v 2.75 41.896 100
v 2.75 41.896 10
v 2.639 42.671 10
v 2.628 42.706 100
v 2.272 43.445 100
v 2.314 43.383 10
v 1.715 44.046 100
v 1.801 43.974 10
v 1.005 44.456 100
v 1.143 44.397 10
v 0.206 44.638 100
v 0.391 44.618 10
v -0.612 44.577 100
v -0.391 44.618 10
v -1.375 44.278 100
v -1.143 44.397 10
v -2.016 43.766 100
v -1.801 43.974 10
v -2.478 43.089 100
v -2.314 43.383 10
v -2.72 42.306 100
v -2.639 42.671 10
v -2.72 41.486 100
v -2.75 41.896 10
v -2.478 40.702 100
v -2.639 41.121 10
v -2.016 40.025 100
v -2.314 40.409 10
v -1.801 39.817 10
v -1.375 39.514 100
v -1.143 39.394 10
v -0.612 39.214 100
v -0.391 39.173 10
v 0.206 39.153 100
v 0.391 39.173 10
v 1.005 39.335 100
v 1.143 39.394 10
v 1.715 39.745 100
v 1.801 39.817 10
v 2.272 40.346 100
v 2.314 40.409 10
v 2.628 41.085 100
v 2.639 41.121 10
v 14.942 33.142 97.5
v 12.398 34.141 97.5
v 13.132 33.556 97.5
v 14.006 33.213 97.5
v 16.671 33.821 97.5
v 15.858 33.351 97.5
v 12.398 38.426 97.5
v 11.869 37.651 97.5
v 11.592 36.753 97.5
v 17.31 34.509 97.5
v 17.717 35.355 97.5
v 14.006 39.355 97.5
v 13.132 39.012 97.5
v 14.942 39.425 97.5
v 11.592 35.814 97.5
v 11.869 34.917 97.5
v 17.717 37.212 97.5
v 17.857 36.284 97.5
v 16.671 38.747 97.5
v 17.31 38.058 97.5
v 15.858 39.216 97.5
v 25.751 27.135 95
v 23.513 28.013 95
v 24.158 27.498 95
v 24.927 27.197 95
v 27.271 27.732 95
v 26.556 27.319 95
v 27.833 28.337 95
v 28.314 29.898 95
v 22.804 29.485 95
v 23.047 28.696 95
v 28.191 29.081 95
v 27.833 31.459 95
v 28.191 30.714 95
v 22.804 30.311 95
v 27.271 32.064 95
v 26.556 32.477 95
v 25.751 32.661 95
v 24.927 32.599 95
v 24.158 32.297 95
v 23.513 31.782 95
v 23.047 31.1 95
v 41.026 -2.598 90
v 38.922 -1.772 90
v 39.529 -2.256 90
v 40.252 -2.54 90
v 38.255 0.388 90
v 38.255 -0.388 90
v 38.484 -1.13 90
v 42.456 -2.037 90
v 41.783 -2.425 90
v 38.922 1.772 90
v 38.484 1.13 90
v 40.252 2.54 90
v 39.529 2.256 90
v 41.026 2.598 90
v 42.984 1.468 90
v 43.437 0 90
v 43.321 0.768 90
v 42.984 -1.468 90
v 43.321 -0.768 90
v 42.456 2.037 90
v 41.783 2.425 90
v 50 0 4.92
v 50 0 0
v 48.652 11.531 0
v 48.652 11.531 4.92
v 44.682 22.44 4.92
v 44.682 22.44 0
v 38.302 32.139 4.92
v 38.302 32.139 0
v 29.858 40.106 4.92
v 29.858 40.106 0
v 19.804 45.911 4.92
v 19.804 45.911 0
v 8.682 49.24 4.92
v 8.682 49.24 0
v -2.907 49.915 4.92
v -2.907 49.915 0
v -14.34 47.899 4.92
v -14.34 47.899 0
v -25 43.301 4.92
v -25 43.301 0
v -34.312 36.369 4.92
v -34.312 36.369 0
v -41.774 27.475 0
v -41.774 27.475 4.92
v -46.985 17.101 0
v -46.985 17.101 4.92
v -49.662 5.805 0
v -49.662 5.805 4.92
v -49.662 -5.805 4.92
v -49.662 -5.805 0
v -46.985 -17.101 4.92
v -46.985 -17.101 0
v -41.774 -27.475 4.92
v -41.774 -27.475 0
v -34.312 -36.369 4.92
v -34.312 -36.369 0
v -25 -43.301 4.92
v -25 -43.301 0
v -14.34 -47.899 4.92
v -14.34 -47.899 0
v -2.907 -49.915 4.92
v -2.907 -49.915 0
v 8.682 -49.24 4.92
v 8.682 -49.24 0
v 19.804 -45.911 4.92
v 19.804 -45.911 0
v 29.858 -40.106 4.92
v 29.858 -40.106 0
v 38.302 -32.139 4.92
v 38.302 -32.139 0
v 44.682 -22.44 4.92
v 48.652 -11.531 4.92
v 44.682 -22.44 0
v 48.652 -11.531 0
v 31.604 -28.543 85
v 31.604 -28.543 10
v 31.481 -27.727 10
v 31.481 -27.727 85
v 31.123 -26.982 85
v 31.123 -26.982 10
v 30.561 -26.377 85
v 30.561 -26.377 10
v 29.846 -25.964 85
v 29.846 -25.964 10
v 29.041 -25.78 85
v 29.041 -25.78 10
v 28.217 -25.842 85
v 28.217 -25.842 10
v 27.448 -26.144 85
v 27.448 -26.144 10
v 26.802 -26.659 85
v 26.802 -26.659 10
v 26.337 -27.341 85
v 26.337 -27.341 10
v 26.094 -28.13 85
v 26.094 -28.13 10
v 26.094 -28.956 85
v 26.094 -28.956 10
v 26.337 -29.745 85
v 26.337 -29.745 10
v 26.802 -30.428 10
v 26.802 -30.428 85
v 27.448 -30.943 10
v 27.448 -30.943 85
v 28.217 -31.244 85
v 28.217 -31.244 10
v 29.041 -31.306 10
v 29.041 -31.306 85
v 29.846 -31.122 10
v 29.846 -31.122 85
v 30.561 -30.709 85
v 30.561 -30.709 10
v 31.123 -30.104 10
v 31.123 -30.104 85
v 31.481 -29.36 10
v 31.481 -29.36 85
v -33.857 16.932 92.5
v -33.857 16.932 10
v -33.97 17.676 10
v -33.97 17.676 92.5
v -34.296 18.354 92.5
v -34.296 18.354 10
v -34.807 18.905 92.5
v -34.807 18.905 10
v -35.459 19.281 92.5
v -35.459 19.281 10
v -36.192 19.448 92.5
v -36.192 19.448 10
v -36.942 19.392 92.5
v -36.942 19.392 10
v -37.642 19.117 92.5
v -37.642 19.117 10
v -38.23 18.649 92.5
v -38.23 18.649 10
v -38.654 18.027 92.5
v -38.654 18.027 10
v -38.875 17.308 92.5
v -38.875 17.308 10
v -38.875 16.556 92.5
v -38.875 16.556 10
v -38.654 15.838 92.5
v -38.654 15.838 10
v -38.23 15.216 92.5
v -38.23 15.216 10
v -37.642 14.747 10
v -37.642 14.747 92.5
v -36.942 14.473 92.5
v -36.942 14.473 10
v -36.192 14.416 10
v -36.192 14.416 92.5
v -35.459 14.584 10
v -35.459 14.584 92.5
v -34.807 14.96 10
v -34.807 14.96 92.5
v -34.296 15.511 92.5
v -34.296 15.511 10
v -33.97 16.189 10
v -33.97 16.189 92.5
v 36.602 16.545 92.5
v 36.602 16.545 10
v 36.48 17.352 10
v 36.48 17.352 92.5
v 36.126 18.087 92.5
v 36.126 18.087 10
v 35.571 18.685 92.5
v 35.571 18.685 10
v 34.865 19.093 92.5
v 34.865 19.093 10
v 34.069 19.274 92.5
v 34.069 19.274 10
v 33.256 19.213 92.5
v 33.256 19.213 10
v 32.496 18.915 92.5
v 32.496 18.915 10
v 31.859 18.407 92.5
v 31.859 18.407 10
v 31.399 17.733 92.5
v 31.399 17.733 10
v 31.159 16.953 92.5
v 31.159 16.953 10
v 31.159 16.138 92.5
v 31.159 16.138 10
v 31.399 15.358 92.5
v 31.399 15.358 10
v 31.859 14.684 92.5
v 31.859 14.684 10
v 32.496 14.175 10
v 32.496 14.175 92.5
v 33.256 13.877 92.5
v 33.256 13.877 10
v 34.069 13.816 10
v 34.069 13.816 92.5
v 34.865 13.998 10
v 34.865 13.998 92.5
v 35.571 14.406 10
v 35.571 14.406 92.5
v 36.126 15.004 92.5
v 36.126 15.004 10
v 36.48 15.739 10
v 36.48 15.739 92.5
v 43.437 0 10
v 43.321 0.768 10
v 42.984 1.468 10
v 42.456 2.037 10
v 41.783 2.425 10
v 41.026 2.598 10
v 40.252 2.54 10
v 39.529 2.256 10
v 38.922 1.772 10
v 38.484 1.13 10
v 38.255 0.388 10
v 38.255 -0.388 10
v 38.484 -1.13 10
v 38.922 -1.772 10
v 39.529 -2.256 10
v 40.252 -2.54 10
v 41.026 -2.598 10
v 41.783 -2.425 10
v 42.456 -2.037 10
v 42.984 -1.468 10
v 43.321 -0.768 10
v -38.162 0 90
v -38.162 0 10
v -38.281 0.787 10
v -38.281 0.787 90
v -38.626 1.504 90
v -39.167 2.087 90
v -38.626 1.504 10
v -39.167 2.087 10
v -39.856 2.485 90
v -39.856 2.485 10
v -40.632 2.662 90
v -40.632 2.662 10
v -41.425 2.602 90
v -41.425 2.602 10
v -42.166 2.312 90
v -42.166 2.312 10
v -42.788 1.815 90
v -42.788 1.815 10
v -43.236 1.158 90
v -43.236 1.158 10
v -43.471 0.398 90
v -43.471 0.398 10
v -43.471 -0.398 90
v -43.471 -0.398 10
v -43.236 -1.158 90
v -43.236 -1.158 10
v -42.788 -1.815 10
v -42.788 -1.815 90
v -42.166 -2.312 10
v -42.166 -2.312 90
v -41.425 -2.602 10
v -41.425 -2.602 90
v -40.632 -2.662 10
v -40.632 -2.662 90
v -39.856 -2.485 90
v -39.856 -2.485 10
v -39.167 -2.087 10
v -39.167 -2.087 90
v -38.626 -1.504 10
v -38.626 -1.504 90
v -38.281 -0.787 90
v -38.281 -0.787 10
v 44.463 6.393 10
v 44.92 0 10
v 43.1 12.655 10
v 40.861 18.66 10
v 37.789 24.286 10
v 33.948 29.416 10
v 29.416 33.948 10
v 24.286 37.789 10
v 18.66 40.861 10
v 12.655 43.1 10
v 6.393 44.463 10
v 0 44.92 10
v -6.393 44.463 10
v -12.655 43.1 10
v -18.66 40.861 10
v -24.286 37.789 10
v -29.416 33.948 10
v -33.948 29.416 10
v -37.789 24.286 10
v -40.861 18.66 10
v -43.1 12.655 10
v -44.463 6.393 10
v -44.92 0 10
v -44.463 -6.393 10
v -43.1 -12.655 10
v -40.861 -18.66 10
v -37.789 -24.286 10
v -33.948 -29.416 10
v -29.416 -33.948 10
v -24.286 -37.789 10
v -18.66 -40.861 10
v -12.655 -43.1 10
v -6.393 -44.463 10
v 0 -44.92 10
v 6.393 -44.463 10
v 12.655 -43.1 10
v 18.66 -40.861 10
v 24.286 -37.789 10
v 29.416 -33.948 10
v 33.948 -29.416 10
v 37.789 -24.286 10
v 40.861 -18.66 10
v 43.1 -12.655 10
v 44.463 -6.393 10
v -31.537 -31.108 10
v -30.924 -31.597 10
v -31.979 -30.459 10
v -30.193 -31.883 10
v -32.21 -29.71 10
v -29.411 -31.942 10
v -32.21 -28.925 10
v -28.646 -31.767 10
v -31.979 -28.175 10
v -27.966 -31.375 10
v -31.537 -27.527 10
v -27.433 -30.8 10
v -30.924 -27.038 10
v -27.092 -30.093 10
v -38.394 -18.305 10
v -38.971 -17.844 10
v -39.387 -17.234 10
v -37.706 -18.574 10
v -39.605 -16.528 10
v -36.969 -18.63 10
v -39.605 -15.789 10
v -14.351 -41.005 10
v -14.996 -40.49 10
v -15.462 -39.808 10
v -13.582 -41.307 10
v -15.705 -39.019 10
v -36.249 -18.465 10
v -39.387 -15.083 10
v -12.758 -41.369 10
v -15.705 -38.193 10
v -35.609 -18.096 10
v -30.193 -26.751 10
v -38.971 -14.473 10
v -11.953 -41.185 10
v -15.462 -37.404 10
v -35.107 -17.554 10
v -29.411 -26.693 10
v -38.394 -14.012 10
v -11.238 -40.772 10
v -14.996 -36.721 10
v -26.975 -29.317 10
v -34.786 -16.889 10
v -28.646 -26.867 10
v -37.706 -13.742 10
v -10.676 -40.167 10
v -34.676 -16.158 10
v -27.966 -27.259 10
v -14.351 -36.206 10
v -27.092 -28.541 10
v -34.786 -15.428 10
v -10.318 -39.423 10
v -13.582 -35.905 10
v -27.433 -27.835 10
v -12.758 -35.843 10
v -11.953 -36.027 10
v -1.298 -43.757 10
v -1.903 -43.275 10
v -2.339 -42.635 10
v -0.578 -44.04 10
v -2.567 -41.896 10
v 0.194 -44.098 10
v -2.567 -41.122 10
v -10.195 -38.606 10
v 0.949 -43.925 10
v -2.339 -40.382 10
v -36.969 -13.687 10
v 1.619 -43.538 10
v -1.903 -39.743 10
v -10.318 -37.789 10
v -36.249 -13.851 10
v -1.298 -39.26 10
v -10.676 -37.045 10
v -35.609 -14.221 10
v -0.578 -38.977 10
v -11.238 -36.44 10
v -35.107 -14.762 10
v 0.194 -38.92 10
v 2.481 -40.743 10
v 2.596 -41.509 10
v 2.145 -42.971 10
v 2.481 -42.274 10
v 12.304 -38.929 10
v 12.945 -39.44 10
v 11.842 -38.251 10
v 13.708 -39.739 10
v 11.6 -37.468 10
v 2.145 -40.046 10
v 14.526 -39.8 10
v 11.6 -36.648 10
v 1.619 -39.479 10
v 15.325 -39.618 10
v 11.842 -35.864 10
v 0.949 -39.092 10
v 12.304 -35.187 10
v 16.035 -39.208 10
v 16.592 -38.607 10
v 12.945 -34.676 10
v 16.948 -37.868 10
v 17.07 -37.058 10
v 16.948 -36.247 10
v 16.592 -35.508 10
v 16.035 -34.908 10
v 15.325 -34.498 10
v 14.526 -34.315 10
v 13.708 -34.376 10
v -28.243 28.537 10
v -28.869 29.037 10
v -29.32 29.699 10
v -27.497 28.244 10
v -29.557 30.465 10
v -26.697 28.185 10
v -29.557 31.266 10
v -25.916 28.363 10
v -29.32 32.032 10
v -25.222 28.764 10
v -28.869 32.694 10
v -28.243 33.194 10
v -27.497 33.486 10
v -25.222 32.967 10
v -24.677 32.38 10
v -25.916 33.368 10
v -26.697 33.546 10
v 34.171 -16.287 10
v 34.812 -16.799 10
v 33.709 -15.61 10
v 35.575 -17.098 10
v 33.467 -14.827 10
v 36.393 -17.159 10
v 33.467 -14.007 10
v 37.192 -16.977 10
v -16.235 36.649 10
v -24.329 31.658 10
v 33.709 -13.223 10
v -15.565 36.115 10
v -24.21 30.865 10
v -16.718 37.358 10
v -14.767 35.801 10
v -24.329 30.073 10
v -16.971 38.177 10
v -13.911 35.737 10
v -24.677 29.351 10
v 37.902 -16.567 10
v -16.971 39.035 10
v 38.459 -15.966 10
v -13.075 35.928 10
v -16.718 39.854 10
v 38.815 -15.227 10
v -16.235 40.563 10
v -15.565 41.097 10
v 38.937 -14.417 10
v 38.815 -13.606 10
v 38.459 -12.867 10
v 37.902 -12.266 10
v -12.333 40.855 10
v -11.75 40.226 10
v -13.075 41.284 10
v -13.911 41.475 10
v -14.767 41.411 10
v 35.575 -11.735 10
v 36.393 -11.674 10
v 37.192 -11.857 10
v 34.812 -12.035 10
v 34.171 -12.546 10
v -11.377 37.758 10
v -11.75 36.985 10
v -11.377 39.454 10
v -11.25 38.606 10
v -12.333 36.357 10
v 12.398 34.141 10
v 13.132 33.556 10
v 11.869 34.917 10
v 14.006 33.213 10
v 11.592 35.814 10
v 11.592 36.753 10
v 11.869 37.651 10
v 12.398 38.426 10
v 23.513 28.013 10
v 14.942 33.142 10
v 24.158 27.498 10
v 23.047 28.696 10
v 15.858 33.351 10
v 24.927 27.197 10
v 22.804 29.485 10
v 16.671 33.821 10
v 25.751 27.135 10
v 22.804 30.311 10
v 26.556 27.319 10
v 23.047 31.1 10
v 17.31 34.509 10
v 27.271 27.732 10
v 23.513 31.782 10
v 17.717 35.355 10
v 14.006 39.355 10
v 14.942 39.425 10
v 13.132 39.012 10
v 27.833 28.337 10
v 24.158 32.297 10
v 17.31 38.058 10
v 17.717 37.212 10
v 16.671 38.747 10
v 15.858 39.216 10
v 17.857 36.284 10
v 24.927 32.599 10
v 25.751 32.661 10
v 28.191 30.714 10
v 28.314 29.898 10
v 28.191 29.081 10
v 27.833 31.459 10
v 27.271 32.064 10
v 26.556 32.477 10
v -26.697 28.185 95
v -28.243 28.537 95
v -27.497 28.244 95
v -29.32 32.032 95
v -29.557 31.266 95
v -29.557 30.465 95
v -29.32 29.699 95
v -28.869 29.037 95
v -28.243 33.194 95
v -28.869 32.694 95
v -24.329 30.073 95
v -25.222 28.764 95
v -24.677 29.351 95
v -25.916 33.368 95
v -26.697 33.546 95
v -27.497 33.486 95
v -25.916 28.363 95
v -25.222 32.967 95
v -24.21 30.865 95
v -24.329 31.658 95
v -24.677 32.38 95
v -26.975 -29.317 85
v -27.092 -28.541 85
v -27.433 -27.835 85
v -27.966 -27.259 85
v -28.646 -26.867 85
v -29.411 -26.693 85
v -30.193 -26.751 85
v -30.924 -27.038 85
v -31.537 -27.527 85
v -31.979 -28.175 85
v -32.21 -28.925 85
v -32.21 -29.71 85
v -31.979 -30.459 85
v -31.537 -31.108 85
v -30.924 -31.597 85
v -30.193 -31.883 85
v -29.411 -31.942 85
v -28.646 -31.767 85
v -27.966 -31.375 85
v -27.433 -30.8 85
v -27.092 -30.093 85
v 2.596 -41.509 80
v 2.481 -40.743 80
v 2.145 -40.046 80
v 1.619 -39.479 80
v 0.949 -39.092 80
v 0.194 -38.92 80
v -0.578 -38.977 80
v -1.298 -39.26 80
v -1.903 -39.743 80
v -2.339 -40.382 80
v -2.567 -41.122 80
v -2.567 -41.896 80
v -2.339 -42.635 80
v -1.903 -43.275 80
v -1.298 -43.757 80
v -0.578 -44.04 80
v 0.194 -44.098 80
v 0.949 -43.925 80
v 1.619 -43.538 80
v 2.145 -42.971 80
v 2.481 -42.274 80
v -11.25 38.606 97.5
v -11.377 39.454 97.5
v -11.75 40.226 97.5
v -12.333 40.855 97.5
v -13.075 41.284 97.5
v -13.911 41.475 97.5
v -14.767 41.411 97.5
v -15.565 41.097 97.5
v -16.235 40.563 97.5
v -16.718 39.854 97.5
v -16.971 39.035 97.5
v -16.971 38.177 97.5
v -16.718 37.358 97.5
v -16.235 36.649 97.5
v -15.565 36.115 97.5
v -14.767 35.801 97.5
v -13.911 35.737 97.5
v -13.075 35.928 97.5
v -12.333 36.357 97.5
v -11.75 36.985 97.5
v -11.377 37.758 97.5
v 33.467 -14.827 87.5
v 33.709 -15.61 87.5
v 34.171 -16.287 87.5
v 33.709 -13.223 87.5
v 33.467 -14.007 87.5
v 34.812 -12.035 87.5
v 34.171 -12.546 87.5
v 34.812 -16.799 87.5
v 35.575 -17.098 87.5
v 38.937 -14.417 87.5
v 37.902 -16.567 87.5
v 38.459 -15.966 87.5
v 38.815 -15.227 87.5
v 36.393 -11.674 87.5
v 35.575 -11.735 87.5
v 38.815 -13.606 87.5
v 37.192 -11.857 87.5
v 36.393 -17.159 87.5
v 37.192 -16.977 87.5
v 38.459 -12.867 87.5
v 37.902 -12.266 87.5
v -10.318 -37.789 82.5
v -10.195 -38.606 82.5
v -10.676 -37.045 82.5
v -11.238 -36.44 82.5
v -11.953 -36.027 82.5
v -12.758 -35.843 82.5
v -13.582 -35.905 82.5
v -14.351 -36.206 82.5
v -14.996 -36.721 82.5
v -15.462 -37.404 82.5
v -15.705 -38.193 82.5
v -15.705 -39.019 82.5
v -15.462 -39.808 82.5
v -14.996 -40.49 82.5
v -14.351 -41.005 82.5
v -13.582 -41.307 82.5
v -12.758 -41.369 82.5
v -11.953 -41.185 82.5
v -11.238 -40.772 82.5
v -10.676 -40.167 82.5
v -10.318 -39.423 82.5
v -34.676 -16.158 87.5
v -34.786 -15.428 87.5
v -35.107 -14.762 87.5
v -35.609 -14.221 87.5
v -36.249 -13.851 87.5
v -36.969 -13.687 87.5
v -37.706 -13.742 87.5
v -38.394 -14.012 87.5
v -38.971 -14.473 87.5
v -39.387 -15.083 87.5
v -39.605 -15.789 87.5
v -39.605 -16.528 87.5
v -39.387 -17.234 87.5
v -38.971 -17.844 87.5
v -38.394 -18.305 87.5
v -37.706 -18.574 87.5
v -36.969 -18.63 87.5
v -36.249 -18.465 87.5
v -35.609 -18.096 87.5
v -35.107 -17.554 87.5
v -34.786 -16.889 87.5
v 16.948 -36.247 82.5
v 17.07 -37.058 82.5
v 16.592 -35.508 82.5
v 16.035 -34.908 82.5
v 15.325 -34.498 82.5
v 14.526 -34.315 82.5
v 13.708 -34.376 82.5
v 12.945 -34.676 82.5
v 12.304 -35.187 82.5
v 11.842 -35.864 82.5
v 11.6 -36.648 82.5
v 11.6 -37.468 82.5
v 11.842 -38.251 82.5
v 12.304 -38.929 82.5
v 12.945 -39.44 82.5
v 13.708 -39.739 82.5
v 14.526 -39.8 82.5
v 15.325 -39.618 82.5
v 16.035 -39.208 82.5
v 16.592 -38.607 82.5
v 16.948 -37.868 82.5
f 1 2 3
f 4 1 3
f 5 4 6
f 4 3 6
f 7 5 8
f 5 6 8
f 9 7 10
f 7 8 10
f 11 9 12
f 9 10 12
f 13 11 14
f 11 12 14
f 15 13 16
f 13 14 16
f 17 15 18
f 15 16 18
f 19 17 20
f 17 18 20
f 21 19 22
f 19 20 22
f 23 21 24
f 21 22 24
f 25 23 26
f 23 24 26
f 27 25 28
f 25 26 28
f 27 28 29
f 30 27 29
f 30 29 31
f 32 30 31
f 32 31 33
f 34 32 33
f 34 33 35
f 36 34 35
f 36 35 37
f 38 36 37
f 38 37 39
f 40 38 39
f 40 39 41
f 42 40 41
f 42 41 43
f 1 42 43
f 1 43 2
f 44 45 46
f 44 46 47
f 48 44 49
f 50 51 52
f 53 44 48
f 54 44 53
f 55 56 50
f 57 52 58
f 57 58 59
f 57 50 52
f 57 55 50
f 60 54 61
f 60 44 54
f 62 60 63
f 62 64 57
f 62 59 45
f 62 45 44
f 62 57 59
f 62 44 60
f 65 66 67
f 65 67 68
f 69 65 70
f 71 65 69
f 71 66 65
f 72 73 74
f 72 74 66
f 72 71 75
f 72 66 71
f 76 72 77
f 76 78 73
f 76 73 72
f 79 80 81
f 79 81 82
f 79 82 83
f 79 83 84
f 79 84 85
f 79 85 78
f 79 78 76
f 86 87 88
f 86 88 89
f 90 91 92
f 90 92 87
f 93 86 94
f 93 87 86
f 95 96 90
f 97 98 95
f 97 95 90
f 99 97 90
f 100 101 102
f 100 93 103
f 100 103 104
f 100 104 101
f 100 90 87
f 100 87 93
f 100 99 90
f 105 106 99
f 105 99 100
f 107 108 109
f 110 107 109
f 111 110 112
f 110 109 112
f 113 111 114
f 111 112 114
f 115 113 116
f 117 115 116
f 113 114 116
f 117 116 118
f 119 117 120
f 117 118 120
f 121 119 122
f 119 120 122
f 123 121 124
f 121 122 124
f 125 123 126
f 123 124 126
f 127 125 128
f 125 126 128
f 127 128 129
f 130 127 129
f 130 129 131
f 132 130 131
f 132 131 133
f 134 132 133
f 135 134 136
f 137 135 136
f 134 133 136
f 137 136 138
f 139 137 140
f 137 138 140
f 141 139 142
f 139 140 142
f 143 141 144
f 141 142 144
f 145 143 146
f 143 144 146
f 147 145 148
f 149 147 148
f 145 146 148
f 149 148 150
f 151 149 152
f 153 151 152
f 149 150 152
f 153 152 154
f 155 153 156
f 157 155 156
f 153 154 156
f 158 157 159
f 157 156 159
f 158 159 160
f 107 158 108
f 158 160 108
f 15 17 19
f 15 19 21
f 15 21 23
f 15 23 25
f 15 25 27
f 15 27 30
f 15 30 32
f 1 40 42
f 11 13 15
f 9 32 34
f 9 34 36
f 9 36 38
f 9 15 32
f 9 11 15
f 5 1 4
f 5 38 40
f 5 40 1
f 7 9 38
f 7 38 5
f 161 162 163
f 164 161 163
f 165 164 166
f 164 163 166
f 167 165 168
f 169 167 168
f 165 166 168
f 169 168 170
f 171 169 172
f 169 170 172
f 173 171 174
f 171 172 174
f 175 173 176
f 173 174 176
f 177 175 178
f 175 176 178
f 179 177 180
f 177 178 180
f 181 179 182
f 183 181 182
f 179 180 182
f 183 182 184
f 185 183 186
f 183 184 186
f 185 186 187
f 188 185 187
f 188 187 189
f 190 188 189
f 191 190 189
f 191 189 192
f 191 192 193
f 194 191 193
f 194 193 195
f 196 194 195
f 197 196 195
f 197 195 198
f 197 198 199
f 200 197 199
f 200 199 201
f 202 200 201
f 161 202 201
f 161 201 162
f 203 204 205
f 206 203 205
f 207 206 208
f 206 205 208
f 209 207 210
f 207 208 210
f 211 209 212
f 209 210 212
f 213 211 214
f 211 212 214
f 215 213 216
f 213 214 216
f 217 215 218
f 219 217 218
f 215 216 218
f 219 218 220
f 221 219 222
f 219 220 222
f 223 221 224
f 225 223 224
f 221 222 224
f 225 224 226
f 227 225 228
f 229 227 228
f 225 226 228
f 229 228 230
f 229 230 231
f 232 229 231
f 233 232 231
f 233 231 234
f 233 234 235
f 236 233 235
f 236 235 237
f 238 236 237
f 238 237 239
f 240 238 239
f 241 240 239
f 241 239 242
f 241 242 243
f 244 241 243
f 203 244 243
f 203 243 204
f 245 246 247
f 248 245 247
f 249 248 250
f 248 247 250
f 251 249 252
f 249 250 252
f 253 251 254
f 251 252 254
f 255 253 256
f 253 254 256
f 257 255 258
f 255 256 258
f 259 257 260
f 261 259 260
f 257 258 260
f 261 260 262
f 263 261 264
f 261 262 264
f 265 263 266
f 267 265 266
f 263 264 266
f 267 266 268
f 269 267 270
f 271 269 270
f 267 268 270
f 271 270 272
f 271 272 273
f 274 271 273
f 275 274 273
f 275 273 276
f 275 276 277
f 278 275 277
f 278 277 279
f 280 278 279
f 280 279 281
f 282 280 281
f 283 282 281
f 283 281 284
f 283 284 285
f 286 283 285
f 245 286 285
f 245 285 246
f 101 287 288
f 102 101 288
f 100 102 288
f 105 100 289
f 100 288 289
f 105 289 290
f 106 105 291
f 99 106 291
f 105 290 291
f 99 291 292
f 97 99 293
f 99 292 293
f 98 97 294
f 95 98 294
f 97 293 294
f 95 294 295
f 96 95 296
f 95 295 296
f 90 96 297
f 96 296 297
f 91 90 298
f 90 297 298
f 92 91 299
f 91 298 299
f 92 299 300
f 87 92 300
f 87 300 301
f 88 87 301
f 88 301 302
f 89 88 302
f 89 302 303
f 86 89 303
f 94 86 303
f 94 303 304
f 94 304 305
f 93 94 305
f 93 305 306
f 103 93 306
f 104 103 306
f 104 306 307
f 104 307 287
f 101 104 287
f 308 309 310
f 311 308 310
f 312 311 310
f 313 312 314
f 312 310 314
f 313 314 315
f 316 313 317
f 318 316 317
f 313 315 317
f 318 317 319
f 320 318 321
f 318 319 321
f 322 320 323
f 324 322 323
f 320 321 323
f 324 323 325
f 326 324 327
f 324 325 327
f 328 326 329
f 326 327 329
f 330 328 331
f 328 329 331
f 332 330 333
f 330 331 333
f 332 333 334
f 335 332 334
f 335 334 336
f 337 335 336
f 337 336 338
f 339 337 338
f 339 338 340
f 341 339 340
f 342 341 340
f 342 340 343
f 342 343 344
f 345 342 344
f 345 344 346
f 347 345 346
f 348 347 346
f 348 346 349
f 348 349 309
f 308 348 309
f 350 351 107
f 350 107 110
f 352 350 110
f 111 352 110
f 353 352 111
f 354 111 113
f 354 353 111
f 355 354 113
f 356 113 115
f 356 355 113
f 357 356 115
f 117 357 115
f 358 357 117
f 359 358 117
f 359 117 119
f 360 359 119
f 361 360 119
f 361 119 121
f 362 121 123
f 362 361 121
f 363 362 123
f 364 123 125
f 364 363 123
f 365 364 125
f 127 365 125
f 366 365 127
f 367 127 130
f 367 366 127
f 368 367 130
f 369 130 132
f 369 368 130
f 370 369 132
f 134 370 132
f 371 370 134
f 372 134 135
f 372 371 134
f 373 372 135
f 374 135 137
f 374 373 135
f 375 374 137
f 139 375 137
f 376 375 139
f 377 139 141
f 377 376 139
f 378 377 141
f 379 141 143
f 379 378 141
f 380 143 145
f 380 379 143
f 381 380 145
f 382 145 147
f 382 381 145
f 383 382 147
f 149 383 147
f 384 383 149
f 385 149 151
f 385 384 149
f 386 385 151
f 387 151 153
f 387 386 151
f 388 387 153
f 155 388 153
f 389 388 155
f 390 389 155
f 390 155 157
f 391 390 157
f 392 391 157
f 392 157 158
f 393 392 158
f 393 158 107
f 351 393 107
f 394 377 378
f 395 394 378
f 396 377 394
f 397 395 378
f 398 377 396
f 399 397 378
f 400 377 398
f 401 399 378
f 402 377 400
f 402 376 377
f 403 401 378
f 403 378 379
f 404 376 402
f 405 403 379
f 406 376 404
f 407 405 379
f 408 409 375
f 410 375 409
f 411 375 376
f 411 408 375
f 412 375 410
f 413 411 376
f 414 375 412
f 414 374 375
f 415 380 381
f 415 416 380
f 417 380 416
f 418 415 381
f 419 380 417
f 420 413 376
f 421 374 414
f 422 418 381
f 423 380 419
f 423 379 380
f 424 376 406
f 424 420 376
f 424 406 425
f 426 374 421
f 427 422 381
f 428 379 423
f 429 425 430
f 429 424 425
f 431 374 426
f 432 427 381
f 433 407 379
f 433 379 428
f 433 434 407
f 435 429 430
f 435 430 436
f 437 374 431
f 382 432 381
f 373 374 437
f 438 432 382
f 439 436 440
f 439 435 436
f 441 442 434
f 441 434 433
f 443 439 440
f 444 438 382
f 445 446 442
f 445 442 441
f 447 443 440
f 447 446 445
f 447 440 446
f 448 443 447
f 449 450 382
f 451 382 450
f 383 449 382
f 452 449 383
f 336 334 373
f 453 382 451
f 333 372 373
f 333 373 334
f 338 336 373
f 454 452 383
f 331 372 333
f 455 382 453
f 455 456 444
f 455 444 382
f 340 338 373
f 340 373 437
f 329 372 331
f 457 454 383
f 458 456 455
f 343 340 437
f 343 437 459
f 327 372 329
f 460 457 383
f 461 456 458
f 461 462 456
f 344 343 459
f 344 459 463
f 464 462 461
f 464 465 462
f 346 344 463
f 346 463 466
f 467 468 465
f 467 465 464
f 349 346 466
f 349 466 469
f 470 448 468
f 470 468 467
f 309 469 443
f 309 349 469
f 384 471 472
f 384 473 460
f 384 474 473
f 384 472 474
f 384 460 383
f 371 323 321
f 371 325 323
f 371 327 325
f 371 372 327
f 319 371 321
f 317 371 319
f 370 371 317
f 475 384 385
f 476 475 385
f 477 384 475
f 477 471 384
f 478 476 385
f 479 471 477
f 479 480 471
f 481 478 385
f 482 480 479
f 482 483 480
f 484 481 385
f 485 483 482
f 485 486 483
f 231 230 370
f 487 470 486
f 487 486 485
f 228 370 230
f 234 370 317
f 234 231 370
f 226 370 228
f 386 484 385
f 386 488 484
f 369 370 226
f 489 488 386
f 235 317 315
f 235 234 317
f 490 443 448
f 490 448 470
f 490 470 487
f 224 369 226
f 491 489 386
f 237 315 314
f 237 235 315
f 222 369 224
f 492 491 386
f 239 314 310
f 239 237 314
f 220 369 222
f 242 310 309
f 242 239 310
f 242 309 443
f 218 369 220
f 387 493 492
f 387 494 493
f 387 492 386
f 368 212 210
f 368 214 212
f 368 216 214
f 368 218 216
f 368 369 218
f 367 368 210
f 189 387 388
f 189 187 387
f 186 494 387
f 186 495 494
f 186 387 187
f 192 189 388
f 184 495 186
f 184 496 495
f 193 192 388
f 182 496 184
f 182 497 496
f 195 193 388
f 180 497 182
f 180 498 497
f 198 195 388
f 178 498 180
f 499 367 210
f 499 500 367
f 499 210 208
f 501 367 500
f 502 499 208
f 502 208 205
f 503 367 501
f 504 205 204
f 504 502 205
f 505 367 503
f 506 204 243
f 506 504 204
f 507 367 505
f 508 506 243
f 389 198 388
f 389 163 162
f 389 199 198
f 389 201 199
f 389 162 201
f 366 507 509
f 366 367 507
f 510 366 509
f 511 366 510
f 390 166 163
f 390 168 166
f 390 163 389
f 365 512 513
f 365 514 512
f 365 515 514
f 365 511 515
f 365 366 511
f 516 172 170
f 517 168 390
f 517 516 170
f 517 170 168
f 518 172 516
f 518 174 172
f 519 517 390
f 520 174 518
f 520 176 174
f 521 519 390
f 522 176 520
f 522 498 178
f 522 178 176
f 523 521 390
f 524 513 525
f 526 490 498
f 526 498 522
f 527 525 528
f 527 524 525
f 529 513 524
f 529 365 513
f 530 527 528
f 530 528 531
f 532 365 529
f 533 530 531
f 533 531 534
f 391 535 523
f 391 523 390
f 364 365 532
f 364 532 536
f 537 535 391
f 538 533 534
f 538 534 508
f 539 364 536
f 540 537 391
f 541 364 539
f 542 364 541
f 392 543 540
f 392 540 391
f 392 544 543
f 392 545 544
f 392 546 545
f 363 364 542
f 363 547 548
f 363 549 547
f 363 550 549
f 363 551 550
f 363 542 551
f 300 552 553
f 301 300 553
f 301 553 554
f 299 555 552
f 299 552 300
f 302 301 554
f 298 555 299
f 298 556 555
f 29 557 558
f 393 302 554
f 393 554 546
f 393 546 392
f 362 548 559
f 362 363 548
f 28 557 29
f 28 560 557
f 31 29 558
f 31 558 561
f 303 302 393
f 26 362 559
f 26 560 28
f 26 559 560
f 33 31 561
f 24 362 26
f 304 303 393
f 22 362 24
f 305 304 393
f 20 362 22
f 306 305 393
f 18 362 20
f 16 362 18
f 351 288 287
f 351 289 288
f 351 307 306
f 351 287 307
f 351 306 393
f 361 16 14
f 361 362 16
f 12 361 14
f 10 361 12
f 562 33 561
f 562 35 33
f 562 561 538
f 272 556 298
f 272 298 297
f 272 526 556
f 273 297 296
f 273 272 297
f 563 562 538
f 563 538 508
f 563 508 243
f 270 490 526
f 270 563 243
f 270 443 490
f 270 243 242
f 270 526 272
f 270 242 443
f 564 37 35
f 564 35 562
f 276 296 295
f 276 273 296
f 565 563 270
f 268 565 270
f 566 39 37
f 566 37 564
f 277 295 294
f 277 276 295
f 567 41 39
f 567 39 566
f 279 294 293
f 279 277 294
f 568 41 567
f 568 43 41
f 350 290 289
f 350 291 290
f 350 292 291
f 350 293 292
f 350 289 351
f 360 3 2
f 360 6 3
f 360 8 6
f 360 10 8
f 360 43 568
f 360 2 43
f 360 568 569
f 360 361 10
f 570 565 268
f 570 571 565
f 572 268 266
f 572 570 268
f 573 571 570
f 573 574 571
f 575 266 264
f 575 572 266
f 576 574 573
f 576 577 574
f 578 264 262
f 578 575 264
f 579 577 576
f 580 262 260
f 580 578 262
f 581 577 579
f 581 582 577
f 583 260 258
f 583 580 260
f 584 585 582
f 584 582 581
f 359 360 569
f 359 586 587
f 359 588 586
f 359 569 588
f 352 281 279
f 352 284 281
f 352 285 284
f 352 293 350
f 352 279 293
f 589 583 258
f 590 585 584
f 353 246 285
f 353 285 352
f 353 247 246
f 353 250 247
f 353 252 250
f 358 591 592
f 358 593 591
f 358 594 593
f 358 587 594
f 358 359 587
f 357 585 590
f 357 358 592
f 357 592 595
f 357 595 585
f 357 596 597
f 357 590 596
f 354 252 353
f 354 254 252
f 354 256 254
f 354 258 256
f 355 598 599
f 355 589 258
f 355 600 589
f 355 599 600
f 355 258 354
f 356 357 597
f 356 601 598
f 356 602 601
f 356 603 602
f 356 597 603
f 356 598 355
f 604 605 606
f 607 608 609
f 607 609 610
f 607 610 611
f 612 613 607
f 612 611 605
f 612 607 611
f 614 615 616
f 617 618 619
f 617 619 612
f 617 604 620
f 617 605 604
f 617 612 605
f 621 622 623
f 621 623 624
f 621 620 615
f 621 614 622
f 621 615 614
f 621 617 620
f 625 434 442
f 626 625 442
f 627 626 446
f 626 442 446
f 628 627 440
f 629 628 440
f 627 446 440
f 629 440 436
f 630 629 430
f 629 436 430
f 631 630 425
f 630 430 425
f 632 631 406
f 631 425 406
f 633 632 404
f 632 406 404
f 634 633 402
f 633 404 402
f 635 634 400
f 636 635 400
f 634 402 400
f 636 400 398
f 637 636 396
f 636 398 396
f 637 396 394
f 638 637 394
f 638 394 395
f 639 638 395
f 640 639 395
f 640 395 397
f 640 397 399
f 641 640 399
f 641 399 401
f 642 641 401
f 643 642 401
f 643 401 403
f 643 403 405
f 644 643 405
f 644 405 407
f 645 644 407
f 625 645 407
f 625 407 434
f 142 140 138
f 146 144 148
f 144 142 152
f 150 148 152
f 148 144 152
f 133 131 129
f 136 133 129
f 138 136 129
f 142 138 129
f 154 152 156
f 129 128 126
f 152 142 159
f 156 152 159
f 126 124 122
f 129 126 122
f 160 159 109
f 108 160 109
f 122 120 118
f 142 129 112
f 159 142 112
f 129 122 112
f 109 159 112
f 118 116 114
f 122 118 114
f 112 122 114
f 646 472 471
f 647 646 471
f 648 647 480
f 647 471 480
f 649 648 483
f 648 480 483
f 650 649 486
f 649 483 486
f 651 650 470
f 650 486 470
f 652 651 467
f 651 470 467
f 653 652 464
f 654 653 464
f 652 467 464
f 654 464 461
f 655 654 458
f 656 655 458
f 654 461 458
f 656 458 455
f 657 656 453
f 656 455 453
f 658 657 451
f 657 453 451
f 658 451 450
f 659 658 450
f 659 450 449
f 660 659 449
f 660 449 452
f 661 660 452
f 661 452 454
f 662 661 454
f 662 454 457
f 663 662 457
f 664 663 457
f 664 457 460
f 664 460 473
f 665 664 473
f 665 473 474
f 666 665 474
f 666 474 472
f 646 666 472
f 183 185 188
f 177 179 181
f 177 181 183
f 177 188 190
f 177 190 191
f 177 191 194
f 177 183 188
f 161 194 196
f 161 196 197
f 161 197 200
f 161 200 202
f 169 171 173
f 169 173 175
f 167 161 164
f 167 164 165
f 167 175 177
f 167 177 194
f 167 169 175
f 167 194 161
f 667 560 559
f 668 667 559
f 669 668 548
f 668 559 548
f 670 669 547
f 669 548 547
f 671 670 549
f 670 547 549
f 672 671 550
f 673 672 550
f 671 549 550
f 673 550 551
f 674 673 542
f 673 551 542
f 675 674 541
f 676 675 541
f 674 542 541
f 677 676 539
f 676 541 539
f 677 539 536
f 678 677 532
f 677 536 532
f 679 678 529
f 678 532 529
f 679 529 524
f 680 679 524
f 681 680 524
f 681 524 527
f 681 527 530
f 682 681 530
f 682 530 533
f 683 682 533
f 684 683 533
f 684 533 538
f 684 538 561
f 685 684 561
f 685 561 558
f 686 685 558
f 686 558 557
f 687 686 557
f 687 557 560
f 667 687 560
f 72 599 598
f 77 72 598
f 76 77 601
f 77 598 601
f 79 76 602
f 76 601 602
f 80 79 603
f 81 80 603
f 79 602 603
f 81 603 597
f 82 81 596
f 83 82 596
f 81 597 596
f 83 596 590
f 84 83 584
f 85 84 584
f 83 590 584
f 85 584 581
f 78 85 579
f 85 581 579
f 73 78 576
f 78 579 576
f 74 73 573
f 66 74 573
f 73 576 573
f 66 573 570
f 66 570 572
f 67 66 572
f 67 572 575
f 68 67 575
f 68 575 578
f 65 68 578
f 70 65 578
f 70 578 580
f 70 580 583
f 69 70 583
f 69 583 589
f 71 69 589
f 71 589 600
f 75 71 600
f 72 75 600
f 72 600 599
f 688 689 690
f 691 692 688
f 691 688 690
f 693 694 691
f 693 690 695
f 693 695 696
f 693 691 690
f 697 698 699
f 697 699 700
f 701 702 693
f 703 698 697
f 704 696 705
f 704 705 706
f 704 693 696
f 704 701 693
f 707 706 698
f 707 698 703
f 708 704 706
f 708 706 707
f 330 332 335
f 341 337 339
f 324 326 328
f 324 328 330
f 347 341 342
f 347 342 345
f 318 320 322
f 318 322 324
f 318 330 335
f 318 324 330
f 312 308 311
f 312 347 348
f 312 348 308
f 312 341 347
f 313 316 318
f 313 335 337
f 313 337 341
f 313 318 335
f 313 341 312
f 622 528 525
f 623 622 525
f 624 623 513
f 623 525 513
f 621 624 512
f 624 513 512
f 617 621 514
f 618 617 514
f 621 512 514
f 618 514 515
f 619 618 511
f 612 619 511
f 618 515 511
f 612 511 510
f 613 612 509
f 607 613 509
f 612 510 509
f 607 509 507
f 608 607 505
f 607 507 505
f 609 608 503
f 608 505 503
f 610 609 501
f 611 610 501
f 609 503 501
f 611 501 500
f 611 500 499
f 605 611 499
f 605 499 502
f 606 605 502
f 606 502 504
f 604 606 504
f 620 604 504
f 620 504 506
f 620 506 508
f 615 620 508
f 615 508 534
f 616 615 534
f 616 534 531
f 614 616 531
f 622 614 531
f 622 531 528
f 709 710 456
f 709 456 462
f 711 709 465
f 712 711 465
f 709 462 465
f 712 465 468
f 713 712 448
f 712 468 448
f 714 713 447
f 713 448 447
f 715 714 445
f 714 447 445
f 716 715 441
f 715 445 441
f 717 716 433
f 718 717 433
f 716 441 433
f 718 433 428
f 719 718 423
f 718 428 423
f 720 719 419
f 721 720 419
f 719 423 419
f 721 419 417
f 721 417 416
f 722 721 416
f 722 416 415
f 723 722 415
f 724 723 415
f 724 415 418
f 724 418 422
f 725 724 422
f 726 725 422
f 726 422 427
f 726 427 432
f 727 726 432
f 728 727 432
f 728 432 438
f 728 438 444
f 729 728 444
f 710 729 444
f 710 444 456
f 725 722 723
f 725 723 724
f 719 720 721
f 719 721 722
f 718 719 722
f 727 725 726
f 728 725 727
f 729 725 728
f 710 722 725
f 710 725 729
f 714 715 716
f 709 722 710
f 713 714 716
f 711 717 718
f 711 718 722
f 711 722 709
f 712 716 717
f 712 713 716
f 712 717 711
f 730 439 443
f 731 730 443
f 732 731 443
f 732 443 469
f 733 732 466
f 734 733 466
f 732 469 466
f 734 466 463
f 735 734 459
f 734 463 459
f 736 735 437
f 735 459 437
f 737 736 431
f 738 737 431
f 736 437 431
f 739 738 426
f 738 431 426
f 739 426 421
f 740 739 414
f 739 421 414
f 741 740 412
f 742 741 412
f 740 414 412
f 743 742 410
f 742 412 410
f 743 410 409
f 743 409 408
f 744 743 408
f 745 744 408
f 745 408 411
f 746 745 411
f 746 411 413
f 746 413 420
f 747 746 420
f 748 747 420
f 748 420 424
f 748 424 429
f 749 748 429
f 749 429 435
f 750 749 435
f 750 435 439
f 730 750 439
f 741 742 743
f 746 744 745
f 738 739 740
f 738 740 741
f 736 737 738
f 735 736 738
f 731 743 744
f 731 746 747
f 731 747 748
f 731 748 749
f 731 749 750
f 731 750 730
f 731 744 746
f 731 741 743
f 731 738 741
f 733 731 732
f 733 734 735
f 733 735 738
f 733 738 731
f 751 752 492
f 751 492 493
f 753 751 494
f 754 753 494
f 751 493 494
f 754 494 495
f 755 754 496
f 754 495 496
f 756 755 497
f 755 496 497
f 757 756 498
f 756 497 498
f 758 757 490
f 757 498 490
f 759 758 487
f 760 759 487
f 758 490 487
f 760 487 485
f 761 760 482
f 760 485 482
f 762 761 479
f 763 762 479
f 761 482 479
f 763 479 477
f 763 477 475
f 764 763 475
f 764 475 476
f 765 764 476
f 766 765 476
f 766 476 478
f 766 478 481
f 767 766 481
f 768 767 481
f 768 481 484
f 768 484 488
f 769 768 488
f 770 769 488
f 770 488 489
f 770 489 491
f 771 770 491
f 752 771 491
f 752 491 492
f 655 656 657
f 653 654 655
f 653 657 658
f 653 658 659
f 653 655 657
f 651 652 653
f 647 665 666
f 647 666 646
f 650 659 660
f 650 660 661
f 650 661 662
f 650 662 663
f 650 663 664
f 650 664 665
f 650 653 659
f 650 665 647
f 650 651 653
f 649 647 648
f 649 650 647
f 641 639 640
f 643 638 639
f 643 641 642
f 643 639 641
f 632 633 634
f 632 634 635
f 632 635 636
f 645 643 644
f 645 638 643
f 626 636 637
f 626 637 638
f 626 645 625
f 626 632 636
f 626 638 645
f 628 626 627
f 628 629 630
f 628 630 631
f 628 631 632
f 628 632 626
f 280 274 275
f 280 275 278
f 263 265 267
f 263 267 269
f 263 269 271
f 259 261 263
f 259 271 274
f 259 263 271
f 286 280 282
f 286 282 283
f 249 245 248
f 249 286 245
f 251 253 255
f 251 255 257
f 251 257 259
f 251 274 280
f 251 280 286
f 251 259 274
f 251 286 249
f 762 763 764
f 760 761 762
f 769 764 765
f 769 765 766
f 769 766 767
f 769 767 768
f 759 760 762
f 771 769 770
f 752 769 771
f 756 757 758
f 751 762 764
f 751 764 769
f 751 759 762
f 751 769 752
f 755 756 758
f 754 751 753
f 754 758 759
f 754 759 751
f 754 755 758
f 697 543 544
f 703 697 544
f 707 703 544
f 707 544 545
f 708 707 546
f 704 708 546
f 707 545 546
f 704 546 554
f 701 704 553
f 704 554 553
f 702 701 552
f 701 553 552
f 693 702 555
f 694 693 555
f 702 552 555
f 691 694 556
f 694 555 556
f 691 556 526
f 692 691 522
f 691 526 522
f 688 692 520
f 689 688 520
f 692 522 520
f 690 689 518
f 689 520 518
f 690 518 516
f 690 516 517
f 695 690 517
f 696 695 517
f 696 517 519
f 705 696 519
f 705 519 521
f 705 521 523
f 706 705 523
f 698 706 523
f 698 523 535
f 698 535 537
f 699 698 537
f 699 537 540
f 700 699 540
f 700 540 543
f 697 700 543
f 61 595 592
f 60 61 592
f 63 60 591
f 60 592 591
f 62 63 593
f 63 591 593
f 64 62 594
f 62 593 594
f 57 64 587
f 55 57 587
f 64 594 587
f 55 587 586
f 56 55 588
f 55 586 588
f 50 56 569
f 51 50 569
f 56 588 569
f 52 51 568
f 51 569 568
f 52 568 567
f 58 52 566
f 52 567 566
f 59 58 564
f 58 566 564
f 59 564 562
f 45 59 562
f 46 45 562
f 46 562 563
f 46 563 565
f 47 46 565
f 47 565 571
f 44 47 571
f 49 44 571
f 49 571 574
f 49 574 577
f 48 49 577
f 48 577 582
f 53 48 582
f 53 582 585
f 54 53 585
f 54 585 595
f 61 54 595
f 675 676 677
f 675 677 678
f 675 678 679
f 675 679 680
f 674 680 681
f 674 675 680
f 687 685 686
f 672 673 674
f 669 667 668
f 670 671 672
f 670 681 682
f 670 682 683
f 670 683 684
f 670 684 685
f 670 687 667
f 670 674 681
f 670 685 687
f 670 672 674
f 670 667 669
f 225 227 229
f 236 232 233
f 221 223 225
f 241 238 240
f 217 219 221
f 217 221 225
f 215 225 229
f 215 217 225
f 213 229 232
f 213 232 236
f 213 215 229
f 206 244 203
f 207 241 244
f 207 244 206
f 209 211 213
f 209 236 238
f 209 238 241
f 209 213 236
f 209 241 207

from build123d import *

# Parameters (mm, degrees)
F0_R      = 50
F0_R_2    = 46.581391
F0_R_3    = 2.632067
F0_R_4    = 2.770688
F0_R_5    = 2.478179
F0_R_6    = 2.596253
F0_R_7    = 2.75034
F0_R_8    = 2.770687
F0_R_9    = 2.750345
F0_R_10   = 2.669152
F0_R_11   = 2.523107
F0_R_12   = 2.688372
F0_R_13   = 2.876785
F0_R_14   = 2.605253
F0_R_15   = 2.736693
F0_R_16   = 3.150169
F0_R_17   = 2.750341
F1_DEPTH  = 10
F2_SIZE   = 5.08
F3_DEPTH  = 100
F4_DEPTH  = 97.5
F5_DEPTH  = 95
F6_DEPTH  = 92.5
F7_DEPTH  = 90
F8_DEPTH  = 87.5
F9_DEPTH  = 85
F10_DEPTH = 82.5
F11_DEPTH = 80


with BuildPart() as f1:
    # F0 (on Top) → F1 (new body)
    with BuildSketch(Plane.XY):
        Circle(F0_R)
        Circle(F0_R_2, mode=Mode.SUBTRACT)
        Circle(F0_R_2)
        with Locations((-29.607549, -29.317277)):
            Circle(F0_R_3, mode=Mode.SUBTRACT)
        with Locations((-12.965396, -38.605922)):
            Circle(F0_R_4, mode=Mode.SUBTRACT)
        with Locations((-37.15457, -16.158367)):
            Circle(F0_R_5, mode=Mode.SUBTRACT)
        with Locations((0, -41.508623)):
            Circle(F0_R_6, mode=Mode.SUBTRACT)
        with Locations((14.319992, -37.057813)):
            Circle(F0_R_7, mode=Mode.SUBTRACT)
        with Locations((28.833498, -28.543224)):
            Circle(F0_R_8, mode=Mode.SUBTRACT)
        with Locations((36.187002, -14.416747)):
            Circle(F0_R_9, mode=Mode.SUBTRACT)
        with Locations((-40.831324, 0)):
            Circle(F0_R_10, mode=Mode.SUBTRACT)
        with Locations((-36.380517, 16.93242)):
            Circle(F0_R_11, mode=Mode.SUBTRACT)
        with Locations((-26.89836, 30.865383)):
            Circle(F0_R_12, mode=Mode.SUBTRACT)
        with Locations((-14.126476, 38.605922)):
            Circle(F0_R_13, mode=Mode.SUBTRACT)
        with Locations((40.831324, 0)):
            Circle(F0_R_14, mode=Mode.SUBTRACT)
        with Locations((33.864841, 16.545395)):
            Circle(F0_R_15, mode=Mode.SUBTRACT)
        with Locations((14.707019, 36.283758)):
            Circle(F0_R_16, mode=Mode.SUBTRACT)
        with Locations((0, 41.895645)):
            Circle(F0_R_17, mode=Mode.SUBTRACT)
        with Locations((25.543767, 29.897818)):
            Circle(F0_R_4, mode=Mode.SUBTRACT)
    extrude(amount=F1_DEPTH)

    # F2
    f2_edges = [f1.edges().sort_by_distance(p)[0] for p in [
        (-50, 0, 10),
    ]]
    chamfer(f2_edges, length=F2_SIZE)

    # F0 (on Top) → F3 (join)
    with BuildSketch(Plane.XY):
        with Locations((0, 41.895645)):
            Circle(F0_R_17)
    extrude(amount=F3_DEPTH)

    # F0 (on Top) → F4 (join)
    with BuildSketch(Plane.XY):
        with Locations((-14.126476, 38.605922)):
            Circle(F0_R_13)
        with Locations((14.707019, 36.283758)):
            Circle(F0_R_16)
    extrude(amount=F4_DEPTH)

    # F0 (on Top) → F5 (join)
    with BuildSketch(Plane.XY):
        with Locations((-26.89836, 30.865383)):
            Circle(F0_R_12)
        with Locations((25.543767, 29.897818)):
            Circle(F0_R_4)
    extrude(amount=F5_DEPTH)

    # F0 (on Top) → F6 (join)
    with BuildSketch(Plane.XY):
        with Locations((-36.380517, 16.93242)):
            Circle(F0_R_11)
        with Locations((33.864841, 16.545395)):
            Circle(F0_R_15)
    extrude(amount=F6_DEPTH)

    # F0 (on Top) → F7 (join)
    with BuildSketch(Plane.XY):
        with Locations((40.831324, 0)):
            Circle(F0_R_14)
        with Locations((-40.831324, 0)):
            Circle(F0_R_10)
    extrude(amount=F7_DEPTH)

    # F0 (on Top) → F8 (join)
    with BuildSketch(Plane.XY):
        with Locations((-37.15457, -16.158367)):
            Circle(F0_R_5)
        with Locations((36.187002, -14.416747)):
            Circle(F0_R_9)
    extrude(amount=F8_DEPTH)

    # F0 (on Top) → F9 (join)
    with BuildSketch(Plane.XY):
        with Locations((28.833498, -28.543224)):
            Circle(F0_R_8)
        with Locations((-29.607549, -29.317277)):
            Circle(F0_R_3)
    extrude(amount=F9_DEPTH)

    # F0 (on Top) → F10 (join)
    with BuildSketch(Plane.XY):
        with Locations((14.319992, -37.057813)):
            Circle(F0_R_7)
        with Locations((-12.965396, -38.605922)):
            Circle(F0_R_4)
    extrude(amount=F10_DEPTH)

    # F0 (on Top) → F11 (join)
    with BuildSketch(Plane.XY):
        with Locations((0, -41.508623)):
            Circle(F0_R_6)
    extrude(amount=F11_DEPTH)


solid = f1.part
